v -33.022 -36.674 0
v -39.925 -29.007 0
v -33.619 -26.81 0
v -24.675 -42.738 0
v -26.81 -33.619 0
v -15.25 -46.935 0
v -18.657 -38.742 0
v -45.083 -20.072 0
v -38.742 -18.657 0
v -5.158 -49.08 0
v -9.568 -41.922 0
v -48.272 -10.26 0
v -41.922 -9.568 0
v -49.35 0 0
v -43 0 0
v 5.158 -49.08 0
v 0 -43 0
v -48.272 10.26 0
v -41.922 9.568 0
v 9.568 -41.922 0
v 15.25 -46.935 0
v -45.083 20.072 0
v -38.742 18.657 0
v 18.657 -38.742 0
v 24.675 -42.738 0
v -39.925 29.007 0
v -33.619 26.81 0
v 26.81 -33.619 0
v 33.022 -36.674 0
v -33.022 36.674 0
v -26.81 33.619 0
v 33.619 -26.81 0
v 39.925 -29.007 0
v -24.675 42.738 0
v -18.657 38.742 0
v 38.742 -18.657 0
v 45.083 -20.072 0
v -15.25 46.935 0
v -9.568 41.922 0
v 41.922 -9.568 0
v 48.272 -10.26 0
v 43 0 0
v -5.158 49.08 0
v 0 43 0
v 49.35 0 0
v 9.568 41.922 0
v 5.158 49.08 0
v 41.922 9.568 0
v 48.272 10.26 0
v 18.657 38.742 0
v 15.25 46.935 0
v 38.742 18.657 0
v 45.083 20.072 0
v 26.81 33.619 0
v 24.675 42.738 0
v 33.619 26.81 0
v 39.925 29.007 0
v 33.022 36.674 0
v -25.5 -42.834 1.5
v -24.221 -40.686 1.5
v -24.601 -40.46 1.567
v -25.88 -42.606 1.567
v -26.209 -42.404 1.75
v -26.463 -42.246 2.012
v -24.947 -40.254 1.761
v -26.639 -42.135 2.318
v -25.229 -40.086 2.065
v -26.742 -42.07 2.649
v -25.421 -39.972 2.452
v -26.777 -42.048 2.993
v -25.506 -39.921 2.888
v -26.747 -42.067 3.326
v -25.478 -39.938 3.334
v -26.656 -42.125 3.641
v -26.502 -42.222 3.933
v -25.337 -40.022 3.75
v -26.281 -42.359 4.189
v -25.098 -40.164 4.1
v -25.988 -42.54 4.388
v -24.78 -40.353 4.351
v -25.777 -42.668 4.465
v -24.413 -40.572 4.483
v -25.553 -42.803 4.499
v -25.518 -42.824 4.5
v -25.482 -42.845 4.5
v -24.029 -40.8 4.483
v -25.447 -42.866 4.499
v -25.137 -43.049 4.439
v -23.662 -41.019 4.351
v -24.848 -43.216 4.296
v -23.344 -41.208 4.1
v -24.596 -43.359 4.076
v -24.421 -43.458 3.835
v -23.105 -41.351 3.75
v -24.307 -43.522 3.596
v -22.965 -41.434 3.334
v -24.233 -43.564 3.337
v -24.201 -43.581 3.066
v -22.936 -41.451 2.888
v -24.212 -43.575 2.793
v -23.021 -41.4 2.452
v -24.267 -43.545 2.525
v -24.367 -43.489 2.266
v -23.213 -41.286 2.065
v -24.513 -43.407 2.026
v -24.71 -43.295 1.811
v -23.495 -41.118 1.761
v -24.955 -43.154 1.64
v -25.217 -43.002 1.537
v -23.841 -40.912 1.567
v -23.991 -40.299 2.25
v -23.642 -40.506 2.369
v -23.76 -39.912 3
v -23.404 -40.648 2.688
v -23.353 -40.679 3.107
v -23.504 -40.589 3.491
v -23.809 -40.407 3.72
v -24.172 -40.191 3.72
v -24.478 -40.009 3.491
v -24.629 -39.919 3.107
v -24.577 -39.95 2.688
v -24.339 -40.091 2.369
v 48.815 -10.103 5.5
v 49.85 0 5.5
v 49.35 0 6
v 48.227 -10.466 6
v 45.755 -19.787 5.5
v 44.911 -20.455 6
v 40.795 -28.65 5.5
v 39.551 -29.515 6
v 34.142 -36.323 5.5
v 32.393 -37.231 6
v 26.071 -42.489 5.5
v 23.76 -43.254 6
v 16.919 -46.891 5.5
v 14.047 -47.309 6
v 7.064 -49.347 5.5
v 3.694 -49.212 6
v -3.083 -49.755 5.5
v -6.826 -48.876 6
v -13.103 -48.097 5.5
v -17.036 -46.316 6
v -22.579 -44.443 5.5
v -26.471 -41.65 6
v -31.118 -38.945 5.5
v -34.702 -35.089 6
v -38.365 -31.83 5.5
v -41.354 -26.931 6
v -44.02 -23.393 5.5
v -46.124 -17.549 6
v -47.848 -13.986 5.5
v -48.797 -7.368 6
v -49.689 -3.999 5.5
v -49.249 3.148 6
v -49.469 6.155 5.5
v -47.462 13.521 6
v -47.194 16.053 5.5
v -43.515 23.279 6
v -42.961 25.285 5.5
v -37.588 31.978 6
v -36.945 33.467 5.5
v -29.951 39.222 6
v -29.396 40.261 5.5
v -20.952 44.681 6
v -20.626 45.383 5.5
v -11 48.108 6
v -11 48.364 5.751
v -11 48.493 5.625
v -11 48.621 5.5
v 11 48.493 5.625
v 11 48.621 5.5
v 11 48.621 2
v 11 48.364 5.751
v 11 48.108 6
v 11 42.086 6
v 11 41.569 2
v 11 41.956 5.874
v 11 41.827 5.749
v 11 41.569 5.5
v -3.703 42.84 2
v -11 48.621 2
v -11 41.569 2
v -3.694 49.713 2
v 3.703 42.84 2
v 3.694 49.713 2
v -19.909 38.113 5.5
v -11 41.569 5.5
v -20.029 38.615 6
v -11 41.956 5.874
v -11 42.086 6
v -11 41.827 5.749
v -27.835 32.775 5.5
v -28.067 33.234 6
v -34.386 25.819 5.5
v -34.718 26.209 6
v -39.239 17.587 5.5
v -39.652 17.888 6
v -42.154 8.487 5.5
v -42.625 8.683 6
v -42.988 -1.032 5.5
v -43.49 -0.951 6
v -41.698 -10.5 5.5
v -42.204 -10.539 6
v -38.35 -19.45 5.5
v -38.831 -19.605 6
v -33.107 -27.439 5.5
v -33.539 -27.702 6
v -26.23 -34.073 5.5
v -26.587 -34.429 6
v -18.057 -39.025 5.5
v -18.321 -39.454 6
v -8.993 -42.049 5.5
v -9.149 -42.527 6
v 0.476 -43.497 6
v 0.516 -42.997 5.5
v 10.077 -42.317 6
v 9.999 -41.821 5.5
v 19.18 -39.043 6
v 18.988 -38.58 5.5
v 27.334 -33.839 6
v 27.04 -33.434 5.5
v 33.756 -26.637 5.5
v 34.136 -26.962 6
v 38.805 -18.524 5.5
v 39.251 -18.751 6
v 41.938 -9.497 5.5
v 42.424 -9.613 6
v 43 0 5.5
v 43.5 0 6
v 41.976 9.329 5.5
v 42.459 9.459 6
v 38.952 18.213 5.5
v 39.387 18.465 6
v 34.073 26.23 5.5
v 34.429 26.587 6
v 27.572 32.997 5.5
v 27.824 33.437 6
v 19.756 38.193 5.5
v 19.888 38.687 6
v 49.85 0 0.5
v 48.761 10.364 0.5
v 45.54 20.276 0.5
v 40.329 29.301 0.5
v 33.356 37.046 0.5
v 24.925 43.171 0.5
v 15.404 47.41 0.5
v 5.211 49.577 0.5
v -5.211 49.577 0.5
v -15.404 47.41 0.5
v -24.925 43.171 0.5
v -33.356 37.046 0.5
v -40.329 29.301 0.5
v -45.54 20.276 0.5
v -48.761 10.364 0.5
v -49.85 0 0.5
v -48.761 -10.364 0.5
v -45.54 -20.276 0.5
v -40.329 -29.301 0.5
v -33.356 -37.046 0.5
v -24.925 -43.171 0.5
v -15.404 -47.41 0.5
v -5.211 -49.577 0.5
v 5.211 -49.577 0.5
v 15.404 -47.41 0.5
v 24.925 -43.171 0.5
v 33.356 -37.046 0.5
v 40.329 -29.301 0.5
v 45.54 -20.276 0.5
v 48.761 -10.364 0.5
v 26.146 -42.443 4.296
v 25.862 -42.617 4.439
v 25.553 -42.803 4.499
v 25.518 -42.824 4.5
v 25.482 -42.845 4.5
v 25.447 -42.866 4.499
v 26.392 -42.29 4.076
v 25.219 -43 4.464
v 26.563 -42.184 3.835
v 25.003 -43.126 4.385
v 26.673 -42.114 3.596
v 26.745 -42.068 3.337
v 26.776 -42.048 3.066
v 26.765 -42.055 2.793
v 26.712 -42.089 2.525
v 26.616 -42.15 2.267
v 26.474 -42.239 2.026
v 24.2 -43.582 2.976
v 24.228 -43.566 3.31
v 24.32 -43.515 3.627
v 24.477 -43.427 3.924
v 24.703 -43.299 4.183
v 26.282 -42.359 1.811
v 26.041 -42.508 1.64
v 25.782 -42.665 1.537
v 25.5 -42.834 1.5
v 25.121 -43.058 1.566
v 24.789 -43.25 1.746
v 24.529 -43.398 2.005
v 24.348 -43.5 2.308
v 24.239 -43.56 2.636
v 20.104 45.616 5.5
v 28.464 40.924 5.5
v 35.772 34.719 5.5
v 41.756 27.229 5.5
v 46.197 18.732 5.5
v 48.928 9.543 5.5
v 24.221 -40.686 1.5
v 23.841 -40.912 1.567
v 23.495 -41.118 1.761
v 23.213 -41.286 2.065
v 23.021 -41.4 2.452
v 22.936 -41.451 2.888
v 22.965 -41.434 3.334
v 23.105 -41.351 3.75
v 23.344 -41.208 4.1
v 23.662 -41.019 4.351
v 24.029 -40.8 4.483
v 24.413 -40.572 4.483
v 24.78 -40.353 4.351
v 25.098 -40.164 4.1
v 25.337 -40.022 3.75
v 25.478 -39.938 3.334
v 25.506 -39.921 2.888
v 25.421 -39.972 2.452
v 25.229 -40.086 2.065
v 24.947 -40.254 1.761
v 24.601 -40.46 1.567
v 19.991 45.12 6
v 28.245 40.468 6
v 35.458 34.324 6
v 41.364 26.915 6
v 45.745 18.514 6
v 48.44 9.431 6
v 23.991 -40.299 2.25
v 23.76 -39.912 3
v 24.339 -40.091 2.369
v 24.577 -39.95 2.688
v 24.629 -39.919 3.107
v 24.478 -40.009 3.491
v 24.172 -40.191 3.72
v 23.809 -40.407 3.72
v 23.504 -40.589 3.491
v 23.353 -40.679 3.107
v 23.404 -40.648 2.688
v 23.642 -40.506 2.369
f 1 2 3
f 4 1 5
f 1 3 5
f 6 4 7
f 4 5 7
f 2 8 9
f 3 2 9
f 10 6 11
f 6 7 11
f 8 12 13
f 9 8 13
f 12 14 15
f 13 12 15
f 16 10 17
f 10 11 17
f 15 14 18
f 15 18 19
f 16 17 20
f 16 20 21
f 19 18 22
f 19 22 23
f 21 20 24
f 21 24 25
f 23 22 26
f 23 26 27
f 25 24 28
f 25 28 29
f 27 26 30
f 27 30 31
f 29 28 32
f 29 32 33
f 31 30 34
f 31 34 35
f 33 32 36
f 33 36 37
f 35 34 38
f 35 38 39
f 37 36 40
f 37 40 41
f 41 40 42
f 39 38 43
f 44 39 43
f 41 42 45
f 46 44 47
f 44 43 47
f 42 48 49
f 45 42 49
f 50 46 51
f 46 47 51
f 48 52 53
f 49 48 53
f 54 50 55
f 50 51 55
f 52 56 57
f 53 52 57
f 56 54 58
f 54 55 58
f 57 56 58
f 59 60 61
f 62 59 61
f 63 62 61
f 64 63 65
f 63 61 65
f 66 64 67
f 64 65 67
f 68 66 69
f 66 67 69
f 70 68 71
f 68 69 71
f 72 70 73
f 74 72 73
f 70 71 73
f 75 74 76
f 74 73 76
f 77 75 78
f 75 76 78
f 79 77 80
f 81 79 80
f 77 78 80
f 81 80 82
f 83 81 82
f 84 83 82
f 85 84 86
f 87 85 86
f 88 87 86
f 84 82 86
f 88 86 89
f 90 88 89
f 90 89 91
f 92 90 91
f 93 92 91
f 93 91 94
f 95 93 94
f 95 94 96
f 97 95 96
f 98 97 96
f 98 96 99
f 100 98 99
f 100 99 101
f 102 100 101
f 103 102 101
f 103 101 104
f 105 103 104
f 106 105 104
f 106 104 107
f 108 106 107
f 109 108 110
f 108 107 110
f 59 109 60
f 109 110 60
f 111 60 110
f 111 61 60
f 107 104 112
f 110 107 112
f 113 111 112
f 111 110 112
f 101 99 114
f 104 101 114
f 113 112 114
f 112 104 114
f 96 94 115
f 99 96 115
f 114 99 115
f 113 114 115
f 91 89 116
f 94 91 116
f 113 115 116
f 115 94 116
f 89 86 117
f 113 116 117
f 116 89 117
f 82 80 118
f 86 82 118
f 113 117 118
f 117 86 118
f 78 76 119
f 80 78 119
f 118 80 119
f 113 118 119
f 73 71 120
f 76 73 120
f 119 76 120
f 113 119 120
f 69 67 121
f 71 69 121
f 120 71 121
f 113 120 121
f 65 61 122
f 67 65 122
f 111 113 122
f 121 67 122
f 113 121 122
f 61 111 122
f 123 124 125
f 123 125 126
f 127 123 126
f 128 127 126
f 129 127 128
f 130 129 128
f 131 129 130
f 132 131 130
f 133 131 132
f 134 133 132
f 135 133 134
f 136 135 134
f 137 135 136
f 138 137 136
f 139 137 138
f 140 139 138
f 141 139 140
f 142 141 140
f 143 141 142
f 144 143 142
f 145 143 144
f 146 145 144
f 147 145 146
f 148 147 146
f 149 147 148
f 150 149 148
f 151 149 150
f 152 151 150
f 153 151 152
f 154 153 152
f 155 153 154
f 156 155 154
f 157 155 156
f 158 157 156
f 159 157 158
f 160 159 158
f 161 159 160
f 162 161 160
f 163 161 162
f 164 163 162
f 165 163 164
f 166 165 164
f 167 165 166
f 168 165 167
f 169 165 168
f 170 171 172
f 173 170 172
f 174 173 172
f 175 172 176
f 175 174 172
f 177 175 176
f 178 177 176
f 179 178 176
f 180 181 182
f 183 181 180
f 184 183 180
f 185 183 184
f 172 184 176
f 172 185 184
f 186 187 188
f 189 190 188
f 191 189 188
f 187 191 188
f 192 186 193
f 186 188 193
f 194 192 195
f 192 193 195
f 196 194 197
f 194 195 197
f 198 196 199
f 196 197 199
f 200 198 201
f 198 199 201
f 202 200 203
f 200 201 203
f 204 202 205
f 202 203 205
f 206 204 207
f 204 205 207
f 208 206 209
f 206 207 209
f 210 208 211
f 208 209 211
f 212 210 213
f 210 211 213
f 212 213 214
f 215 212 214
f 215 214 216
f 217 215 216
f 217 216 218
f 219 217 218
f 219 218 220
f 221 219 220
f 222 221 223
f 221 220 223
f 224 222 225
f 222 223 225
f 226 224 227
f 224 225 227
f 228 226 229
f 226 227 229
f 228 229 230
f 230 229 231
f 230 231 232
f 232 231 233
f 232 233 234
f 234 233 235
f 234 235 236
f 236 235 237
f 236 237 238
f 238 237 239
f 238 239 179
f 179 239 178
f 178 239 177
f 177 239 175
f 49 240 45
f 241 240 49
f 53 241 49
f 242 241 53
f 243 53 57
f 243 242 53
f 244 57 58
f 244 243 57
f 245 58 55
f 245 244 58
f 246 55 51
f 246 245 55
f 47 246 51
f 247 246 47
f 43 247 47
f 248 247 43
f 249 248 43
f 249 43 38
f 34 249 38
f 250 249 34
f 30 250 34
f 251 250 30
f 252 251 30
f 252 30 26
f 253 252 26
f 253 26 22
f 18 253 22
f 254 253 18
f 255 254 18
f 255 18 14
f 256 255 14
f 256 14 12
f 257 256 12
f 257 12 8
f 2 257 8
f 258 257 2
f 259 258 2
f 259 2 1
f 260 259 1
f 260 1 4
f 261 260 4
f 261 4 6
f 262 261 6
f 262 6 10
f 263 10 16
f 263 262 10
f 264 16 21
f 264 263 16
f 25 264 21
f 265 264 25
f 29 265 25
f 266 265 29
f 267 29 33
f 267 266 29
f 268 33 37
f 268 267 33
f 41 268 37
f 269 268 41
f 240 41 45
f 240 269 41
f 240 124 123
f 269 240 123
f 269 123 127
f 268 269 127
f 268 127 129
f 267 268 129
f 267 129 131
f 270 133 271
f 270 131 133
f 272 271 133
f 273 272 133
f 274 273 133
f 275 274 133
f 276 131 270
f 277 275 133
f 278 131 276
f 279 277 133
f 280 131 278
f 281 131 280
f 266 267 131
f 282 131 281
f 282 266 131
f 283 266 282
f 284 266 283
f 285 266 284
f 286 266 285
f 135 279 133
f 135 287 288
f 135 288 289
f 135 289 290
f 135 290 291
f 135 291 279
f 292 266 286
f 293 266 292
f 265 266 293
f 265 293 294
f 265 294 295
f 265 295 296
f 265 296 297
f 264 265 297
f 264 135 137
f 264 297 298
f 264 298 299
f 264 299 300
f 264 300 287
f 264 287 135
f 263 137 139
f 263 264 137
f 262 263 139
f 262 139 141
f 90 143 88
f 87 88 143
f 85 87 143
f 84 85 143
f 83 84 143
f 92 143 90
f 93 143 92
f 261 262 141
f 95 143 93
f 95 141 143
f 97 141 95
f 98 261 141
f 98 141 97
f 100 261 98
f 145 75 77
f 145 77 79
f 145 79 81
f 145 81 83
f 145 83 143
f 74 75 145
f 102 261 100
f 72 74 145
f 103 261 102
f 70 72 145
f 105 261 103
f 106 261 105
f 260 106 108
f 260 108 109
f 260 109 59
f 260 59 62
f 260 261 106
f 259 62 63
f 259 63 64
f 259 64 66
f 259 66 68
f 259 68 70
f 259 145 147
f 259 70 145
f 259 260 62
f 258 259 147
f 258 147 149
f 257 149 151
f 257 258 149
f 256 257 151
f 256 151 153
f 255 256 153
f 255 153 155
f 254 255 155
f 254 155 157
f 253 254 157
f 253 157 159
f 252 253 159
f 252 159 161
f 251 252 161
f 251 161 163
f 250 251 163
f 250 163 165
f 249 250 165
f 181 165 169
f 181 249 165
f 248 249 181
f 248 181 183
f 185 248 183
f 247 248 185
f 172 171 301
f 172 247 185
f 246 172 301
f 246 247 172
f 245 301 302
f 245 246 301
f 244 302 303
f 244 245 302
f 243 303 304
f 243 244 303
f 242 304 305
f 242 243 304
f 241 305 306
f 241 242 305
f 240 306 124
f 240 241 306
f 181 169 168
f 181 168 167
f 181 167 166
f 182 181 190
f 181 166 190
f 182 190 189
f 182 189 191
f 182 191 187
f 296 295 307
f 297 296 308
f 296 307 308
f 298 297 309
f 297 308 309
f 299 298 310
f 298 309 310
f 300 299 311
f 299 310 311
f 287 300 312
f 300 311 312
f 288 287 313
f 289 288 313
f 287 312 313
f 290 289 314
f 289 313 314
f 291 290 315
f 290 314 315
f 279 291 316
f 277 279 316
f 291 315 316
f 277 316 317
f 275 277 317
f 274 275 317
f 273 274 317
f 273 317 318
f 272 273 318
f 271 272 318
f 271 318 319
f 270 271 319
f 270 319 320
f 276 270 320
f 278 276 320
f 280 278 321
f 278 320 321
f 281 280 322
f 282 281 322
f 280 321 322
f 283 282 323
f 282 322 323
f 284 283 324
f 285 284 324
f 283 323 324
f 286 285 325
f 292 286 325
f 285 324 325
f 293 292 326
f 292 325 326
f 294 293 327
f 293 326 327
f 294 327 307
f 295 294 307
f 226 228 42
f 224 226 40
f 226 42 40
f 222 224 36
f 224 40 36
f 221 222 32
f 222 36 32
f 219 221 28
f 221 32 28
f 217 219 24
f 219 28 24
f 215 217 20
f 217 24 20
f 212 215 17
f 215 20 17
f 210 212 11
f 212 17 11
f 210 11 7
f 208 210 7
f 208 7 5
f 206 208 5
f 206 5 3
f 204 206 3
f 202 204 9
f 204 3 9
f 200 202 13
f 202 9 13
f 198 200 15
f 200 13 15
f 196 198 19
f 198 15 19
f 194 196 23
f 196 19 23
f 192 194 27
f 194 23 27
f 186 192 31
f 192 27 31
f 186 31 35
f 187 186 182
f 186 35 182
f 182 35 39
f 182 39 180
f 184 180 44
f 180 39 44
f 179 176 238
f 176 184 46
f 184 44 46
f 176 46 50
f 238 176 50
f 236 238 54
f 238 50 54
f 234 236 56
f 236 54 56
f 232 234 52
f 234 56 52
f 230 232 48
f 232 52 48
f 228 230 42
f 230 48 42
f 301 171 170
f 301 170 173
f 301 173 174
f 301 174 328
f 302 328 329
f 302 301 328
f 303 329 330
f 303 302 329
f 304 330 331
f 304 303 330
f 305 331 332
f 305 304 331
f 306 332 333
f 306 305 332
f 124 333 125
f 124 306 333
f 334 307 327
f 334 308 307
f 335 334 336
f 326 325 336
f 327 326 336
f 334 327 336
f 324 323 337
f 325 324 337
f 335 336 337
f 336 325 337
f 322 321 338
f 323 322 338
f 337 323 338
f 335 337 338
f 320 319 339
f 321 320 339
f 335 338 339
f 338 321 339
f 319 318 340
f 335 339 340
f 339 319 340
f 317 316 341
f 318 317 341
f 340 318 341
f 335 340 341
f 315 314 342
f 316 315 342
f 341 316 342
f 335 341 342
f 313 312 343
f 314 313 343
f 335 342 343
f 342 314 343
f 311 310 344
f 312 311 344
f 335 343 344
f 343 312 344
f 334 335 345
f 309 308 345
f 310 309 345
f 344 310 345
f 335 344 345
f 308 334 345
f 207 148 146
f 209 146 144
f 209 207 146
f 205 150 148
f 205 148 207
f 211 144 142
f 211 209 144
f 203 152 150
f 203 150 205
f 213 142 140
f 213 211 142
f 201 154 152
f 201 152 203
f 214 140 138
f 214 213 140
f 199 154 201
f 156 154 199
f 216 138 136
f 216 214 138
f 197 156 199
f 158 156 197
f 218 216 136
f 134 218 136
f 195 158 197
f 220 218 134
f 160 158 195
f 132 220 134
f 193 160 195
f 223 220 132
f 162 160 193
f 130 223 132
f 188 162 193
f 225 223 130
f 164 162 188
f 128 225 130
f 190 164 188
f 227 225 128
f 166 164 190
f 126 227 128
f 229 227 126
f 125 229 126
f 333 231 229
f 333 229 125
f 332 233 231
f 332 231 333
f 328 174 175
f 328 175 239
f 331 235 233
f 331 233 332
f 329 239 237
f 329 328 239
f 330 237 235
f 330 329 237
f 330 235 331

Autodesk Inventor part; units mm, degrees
sketch "草圖1" plane through (0, 0, 0) normal (0, 0, 1) x (1, 0, 0)
  circle A0 centre (0, 0) radius 49.85
  circle A1 centre (0, 0) radius 43
  dimension "d0" = 99.7
  dimension "d3" = 86
extrude "擠出1" add sketch "草圖1" along normal blind 6
sketch "草圖2" plane through (0, 0, 6) normal (0, 0, 1) x (1, 0, 0)
  circle A0 centre (0, 0) radius 43 projected
  circle A1 centre (0, 0) radius 49.85 projected
  line L0 (0, 0) -> (0, 49.85)
  line L1 (11, 48.6212) -> (11, 41.5692)
  line L2 (-11, 48.6212) -> (-11, 41.5692)
  dimension "d6" = 22
extrude "擠出2" cut sketch "草圖2" against normal blind 4 contours A0 L0 A1 L1 | L2 A1 L0 A0
ref_plane "工作平面1" through (0, 0, 3) normal (0, 0, 1) x (1, 0, 0)
sketch "草圖3" plane through (0, 0, 3) normal (0, 0, 1) x (1, 0, 0)
  line L0 (0, 0) -> (0, -42.4806)
  line L1 (0, 0) -> (-25.5, -42.8342)
  line L2 (0, 0) -> (25.5, -42.8342)
  arc A0 (-11, 48.6212) -> (11, 48.6212) centre (0, 0) ccw projected
  line L3 (-25.5, -42.8342) -> (25.5, -42.8342)
  dimension "d9" = 51
  dimension "d27" = 61.532
  dimension "d28" = 30.766
  dimension "d29" = 30.766
ref_plane "工作平面2" through (25.5, -42.8342, 3) normal (0.5115346, -0.8592627, 0) x (0.8592627, 0.5115346, 0)
ref_plane "工作平面3" through (-25.5, -42.8342, 3) normal (-0.5115346, -0.8592627, 0) x (0.8592627, -0.5115346, 0)
sketch "草圖4" plane through (25.5, -42.8342, 3) normal (0.5115346, -0.8592627, 0) x (0.8592627, 0.5115346, 0)
  point P0 (0, -3)
  point P1 (0, 0)
hole "孔1" at (25.5, -42.8342, 3) direction (-0.5115346, 0.8592627, 0) diameter 3 depth 2.5 tip angle 118
sketch "草圖5" plane through (-25.5, -42.8342, 3) normal (-0.5115346, -0.8592627, 0) x (0.8592627, -0.5115346, 0)
  point P0 (0, -3)
  point P1 (0, 0)
hole "孔2" at (-25.5, -42.8342, 3) direction (0.5115346, 0.8592627, 0) diameter 3 depth 2.5 tip angle 118
chamfer "倒角1" distance 0.5 angle 45 5 edges at (-26.2298, -34.0735, 6) (34.0735, 26.2298, 6) (-49.85, 0, 0) (-31.1181, -38.9447, 6) (38.9447, 31.1181, 6)
properties part number "KE-SP-02-P1"
